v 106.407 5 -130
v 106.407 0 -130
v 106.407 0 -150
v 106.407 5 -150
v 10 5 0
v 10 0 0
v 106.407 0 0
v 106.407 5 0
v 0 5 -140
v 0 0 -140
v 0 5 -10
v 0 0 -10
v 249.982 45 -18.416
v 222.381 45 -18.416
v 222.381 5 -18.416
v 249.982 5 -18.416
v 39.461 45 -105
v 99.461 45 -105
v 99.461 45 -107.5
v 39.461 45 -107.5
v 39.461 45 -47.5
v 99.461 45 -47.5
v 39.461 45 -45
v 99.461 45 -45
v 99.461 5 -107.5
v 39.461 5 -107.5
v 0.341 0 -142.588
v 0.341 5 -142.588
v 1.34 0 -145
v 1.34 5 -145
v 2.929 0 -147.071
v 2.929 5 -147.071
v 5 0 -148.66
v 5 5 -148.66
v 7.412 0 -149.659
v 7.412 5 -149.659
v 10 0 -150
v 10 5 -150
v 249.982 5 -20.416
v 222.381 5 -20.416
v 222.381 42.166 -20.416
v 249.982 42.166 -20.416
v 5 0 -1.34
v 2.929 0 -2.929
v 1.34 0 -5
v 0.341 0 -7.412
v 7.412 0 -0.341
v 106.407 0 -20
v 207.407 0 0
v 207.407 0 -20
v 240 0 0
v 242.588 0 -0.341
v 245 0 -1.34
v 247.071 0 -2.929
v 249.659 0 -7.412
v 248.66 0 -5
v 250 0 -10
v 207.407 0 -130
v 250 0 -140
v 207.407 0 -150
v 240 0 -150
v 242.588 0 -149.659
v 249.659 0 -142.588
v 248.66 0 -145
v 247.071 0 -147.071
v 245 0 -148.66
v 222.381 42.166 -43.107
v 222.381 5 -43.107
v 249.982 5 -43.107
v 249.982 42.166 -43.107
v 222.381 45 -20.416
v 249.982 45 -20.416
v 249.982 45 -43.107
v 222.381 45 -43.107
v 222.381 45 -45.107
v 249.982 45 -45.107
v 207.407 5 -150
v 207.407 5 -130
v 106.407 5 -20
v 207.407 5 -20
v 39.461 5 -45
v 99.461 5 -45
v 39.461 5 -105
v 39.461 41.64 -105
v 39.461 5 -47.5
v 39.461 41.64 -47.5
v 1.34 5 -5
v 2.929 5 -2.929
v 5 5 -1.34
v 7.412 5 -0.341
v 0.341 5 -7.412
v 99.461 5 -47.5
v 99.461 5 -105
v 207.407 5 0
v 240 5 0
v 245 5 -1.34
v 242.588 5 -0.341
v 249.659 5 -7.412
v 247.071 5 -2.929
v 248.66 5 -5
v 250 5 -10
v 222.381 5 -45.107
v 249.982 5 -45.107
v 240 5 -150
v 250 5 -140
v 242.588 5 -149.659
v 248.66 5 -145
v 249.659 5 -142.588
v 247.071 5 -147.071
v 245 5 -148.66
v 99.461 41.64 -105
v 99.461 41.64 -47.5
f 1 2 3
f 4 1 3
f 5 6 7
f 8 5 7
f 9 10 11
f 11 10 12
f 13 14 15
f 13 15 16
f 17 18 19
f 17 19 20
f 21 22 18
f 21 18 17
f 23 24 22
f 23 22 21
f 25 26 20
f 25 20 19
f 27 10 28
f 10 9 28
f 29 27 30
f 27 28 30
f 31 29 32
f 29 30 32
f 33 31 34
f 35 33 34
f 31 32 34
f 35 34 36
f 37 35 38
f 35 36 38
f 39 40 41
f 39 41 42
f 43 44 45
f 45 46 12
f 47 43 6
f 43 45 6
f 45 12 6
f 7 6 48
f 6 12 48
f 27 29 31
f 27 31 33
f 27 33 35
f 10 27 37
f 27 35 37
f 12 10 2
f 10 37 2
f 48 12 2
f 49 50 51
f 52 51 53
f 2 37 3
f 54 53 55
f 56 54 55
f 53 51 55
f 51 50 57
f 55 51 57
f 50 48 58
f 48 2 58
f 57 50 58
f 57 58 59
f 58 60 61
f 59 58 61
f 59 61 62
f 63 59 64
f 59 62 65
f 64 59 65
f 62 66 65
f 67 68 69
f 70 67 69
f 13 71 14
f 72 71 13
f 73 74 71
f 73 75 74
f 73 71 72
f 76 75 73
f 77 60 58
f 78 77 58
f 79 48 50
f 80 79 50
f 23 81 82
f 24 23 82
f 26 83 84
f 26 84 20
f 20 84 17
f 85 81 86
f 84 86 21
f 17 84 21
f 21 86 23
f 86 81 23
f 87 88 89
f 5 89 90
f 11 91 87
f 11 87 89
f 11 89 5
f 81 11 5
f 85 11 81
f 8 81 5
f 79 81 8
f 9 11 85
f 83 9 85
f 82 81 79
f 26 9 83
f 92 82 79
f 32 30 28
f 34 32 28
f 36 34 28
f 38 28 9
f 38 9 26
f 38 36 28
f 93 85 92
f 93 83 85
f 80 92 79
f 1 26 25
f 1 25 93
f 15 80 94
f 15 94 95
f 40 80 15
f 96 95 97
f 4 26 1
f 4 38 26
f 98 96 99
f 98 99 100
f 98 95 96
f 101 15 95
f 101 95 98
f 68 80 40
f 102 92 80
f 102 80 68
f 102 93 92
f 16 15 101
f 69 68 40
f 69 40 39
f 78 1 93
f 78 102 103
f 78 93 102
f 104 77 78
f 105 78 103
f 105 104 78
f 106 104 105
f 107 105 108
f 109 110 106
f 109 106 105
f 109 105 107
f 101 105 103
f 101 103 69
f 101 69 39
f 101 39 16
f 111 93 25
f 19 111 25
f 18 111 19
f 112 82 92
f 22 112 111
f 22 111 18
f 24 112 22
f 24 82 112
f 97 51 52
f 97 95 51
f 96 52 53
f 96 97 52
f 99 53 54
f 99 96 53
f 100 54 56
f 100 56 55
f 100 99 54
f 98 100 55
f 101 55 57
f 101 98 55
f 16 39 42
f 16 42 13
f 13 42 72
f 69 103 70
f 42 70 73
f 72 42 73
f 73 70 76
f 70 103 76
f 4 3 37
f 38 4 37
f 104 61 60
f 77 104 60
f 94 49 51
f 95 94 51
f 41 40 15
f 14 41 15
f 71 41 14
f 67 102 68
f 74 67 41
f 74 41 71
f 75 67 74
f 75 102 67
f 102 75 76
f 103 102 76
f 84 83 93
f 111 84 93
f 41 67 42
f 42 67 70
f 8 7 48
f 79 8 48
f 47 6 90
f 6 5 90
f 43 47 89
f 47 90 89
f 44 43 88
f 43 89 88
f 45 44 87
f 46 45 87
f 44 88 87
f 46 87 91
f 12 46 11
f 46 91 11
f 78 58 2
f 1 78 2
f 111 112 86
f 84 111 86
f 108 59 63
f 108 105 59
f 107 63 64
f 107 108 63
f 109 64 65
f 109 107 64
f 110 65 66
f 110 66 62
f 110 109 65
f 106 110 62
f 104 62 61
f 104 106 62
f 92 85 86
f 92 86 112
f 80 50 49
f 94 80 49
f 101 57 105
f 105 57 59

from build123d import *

# Parameters (mm, degrees)
BOSS_EXTRUDE1_DEPTH = 5
SKETCH2_W           = 27.600843984
SKETCH2_H           = 2
SKETCH2_W_2         = 60
SKETCH2_H_2         = 2.5
BOSS_EXTRUDE2_DEPTH = 40
SKETCH4_W           = 27.600843984
SKETCH4_H           = 2.834104075
BOSS_EXTRUDE4_DEPTH = 22.691339628
SKETCH5_W           = 60
SKETCH5_H           = 3.359629359
BOSS_EXTRUDE5_DEPTH = 57.5
FILLET1_R           = 10


with BuildPart() as part:
    # Sketch1 → Boss-Extrude1 (new body)
    with BuildSketch(Plane(origin=(0, 0, 0), x_dir=(1, 0, 0), z_dir=(0, 1, 0))):
        Polygon((106.407471576, 20), (207.407471576, 20), (207.407471576, 0), (250, 0), (250, 150), (207.407471576, 150), (207.407471576, 130), (106.407471576, 130), (106.407471576, 150), (0, 150), (0, 0), (106.407471576, 0), align=None)
    extrude(amount=BOSS_EXTRUDE1_DEPTH)

    # Sketch2 → Boss-Extrude2 (add)
    with BuildSketch(Plane(origin=(0, 5, 0), x_dir=(1, 0, 0), z_dir=(0, 1, 0))):
        with Locations((236.181530472, 44.106973221)):
            Rectangle(SKETCH2_W, SKETCH2_H)
        with Locations((236.181530472, 19.415633593)):
            Rectangle(SKETCH2_W, SKETCH2_H)
        with Locations((69.460984605, 106.25)):
            Rectangle(SKETCH2_W_2, SKETCH2_H_2)
        with Locations((69.460984605, 46.25)):
            Rectangle(SKETCH2_W_2, SKETCH2_H_2)
    extrude(amount=BOSS_EXTRUDE2_DEPTH)

    # Sketch4 → Boss-Extrude4 (add)
    with BuildSketch(Plane.XY.offset(-43.106973221)):
        with Locations((236.181530472, 43.582947963)):
            Rectangle(SKETCH4_W, SKETCH4_H)
    extrude(amount=BOSS_EXTRUDE4_DEPTH)

    # Sketch5 → Boss-Extrude5 (add)
    with BuildSketch(Plane(origin=(0, 0, -47.5), x_dir=(-1, 0, 0), z_dir=(0, 0, -1))):
        with Locations((-69.460984605, 43.320185321)):
            Rectangle(SKETCH5_W, SKETCH5_H)
    extrude(amount=BOSS_EXTRUDE5_DEPTH)

    # Fillet1
    fillet1_edges = [part.edges().sort_by_distance(p)[0] for p in [
        (0, 2.5, -150),
        (250, 2.5, -150),
        (250, 2.5, 0),
        (0, 2.5, 0),
    ]]
    fillet(fillet1_edges, radius=FILLET1_R)


solid = part.part
